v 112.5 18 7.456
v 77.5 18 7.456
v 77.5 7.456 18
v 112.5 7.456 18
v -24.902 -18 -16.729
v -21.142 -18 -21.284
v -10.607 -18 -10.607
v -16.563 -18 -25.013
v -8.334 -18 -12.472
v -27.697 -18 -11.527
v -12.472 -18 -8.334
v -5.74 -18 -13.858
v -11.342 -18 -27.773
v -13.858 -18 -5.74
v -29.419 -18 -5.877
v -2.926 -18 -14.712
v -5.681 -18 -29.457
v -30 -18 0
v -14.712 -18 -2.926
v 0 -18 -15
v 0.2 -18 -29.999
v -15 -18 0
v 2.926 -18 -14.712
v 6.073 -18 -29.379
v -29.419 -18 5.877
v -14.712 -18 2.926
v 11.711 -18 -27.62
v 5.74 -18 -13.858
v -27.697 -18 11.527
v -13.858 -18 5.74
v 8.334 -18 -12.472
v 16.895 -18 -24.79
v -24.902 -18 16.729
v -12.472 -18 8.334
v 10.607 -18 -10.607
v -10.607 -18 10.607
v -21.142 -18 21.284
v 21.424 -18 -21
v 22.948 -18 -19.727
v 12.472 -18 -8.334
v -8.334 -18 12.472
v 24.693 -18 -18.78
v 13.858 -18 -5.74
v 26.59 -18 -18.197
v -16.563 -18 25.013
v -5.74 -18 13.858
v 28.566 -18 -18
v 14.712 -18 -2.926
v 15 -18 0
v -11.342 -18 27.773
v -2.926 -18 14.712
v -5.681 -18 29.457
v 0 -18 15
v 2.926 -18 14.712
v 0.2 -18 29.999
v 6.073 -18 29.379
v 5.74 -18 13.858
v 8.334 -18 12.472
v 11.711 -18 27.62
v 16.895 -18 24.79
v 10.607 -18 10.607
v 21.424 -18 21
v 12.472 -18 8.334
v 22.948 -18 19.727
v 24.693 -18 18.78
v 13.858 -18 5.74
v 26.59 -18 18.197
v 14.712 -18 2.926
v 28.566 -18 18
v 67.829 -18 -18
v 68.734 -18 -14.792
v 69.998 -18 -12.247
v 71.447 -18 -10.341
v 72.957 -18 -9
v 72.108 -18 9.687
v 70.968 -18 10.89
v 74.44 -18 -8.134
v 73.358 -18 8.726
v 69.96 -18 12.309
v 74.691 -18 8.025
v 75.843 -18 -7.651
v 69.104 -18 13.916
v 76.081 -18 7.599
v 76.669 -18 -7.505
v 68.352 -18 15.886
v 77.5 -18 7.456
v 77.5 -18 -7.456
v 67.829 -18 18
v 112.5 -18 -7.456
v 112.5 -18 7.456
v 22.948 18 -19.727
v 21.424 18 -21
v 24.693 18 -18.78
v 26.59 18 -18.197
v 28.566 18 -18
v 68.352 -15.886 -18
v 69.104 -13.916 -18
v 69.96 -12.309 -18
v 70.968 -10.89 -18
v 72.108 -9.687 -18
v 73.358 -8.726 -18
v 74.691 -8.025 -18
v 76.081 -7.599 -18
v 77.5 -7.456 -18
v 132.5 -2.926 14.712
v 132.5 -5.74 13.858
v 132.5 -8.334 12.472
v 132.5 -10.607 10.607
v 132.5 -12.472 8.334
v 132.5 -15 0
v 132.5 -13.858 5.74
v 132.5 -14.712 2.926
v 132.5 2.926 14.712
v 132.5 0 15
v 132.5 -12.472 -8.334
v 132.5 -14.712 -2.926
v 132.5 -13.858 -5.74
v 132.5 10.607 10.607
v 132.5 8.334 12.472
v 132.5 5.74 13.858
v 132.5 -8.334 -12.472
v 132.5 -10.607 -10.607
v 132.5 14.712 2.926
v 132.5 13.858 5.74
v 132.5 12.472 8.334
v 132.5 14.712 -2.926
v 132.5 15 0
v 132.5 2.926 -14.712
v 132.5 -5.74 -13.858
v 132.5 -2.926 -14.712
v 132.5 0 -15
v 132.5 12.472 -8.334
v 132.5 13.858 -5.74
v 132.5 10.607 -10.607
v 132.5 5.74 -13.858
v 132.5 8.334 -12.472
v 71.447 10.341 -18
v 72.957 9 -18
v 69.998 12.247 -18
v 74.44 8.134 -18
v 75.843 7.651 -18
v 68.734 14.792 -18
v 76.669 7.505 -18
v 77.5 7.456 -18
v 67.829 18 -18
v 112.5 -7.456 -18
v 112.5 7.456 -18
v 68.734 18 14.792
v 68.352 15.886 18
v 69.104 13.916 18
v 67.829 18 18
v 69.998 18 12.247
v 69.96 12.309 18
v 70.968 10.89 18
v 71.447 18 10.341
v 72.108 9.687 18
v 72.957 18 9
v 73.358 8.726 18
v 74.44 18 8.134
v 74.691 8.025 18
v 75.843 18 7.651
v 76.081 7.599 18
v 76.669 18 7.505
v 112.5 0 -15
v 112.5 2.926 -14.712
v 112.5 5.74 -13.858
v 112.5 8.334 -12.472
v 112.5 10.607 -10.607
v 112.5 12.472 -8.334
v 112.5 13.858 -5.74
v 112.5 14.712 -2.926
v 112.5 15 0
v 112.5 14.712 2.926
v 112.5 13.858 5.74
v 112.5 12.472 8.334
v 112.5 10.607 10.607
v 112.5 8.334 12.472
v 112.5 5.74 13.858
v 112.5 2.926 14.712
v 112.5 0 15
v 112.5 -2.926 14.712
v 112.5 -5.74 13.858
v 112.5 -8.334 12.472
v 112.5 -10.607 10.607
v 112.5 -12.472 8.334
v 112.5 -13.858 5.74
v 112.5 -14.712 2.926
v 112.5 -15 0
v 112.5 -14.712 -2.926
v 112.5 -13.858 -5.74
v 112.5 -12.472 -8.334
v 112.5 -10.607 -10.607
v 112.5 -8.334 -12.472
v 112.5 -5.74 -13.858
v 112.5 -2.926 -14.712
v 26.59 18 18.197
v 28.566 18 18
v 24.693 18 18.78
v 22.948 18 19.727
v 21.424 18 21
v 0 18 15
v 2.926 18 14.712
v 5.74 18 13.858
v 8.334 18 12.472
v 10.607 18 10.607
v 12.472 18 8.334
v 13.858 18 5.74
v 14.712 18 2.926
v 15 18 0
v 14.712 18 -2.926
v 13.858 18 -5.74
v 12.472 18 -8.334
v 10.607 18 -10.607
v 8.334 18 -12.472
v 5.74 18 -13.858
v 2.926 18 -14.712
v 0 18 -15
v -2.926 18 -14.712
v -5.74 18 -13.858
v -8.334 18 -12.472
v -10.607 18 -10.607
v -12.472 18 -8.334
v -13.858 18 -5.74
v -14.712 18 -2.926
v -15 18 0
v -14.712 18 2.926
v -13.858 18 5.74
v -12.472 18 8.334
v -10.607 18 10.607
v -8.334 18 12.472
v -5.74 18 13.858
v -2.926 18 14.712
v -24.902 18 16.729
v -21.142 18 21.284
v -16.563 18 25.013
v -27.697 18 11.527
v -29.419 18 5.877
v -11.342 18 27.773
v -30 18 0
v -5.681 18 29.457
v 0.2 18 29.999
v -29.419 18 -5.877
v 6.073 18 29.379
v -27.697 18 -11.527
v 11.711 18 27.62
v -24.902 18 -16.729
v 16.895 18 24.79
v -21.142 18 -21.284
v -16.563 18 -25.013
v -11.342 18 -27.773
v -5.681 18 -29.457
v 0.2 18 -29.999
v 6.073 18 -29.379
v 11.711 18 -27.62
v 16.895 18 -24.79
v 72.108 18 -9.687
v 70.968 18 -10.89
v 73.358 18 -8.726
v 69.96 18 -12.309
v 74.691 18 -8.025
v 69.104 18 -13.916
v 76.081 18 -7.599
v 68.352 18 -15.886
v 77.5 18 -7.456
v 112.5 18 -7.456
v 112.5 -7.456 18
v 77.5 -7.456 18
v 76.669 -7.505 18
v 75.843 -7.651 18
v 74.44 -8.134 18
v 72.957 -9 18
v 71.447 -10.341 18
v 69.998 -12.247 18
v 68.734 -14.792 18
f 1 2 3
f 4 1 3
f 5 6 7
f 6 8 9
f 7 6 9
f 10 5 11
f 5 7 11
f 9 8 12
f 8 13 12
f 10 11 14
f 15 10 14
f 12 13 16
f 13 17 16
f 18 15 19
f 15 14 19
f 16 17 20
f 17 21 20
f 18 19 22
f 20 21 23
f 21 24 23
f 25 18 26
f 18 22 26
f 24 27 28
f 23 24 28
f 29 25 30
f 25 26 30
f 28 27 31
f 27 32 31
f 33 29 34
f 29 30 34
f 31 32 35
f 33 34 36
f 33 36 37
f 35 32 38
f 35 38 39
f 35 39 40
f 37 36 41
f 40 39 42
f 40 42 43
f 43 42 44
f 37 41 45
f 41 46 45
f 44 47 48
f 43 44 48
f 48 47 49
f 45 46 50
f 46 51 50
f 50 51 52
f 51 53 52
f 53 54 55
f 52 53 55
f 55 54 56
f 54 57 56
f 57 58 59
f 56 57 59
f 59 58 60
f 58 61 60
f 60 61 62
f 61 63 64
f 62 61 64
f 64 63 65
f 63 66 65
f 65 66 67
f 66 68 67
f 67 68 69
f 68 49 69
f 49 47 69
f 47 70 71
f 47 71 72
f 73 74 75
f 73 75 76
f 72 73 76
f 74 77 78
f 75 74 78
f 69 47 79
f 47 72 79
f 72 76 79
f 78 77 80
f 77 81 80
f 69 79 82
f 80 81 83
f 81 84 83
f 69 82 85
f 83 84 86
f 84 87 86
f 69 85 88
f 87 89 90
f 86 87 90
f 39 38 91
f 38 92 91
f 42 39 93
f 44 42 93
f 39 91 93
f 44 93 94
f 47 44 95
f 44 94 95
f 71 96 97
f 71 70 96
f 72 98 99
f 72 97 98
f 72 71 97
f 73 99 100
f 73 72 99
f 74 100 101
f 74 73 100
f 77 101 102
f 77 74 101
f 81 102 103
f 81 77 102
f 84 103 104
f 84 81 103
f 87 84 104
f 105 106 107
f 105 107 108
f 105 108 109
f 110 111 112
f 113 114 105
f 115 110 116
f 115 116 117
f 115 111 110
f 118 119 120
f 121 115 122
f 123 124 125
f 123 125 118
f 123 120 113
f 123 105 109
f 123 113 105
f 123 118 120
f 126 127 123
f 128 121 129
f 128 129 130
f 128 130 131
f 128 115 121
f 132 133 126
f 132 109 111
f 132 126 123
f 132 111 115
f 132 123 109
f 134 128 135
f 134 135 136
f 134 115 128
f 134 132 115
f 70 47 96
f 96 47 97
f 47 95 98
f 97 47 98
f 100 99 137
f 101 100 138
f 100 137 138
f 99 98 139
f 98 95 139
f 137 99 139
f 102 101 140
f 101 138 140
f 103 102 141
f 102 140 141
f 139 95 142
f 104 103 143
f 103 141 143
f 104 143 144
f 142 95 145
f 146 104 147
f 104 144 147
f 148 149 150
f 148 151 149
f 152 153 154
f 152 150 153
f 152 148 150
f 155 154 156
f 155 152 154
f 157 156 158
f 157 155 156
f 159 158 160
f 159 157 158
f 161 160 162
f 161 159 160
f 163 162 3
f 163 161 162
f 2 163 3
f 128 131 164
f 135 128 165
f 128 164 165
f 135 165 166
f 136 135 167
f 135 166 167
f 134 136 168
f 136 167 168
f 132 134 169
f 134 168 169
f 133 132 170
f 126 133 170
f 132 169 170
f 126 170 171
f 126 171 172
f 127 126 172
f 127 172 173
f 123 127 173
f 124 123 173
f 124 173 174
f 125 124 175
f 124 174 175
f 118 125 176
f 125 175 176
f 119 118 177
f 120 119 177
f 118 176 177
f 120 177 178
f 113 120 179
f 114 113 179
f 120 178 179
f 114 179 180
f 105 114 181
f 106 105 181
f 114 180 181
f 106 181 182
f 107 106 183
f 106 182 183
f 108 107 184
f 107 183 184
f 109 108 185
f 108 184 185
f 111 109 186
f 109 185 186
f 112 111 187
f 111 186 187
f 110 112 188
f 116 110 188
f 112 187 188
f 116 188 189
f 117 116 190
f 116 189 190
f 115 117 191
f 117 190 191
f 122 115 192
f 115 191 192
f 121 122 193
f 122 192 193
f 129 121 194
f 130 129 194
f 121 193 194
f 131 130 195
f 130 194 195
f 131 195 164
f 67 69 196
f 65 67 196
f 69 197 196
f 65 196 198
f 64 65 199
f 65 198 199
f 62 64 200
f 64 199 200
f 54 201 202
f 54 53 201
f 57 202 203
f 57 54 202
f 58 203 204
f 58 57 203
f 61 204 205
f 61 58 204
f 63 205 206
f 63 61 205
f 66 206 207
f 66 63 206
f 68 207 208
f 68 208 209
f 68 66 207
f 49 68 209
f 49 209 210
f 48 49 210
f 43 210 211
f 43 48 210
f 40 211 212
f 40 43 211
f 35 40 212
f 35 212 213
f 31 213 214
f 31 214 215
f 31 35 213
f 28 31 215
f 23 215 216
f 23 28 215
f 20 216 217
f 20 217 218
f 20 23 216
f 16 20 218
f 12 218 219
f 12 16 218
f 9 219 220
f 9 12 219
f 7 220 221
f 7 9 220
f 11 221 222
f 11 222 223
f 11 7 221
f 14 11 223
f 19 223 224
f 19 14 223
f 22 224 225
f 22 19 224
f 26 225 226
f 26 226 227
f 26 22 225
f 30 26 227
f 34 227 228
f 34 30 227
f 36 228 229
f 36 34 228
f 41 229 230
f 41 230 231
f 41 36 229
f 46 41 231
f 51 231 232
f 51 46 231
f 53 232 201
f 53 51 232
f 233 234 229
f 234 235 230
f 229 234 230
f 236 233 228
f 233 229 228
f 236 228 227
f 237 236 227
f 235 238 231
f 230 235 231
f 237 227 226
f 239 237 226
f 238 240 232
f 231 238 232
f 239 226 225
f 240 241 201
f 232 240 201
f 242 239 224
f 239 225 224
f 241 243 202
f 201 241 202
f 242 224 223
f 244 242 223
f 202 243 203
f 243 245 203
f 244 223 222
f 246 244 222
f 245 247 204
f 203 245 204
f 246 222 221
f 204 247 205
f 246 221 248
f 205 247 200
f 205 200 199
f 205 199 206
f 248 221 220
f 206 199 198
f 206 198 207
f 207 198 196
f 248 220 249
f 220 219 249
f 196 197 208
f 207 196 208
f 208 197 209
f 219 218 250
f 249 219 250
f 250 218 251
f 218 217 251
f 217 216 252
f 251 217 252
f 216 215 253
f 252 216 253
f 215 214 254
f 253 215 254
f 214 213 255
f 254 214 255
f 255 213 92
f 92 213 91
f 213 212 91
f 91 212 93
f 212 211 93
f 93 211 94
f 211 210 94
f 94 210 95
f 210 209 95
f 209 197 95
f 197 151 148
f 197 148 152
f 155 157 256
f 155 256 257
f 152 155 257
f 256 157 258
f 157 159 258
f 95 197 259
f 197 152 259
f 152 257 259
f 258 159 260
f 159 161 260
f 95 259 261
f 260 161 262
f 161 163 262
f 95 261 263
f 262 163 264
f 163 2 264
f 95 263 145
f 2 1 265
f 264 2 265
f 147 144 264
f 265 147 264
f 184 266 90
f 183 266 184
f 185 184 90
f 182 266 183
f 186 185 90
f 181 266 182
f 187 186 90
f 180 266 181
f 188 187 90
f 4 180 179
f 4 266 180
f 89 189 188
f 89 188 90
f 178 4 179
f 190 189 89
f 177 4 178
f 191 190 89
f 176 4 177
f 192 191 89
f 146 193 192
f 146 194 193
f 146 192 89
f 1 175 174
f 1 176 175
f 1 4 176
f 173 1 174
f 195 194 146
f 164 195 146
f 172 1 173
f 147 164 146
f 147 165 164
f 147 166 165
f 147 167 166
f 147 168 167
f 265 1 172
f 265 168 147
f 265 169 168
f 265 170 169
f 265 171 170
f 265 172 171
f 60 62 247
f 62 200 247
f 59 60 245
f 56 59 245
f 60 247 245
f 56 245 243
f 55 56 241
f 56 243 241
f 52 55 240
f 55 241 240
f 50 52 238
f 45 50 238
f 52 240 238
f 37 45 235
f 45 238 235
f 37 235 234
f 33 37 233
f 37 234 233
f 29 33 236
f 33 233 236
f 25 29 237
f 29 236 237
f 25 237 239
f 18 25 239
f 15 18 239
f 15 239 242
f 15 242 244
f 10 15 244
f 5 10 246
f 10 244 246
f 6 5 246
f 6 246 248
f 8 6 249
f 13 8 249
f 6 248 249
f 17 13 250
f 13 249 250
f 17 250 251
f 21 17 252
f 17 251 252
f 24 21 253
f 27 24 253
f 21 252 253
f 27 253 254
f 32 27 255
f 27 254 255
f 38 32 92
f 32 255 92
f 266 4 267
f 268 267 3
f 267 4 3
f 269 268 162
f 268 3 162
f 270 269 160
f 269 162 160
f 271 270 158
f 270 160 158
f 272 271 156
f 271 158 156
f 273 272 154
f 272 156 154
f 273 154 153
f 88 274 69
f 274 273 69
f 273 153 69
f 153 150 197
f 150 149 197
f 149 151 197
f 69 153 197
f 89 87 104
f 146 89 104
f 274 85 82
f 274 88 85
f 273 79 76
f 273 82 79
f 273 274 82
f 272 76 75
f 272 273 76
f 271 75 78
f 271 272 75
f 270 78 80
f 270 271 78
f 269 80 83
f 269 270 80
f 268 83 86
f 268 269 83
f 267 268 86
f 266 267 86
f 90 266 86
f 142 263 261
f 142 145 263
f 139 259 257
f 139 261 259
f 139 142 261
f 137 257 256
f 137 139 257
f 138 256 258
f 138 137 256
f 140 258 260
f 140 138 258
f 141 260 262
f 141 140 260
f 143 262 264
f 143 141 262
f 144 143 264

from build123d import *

# Parameters (mm, degrees)
CROQUIS1_R              = 15
SALIENTE_EXTRUIR1_DEPTH = 18
SALIENTE_EXTRUIR2_DEPTH = 45
CROQUIS3_R              = 15
SALIENTE_EXTRUIR3_DEPTH = 20
REDONDEO1_R             = 10
REDONDEO2_R             = 10


with BuildPart() as part:
    # Croquis1 → Saliente-Extruir1 (new, symmetric)
    with BuildSketch(Plane(origin=(0, 0, 0), x_dir=(1, 0, 0), z_dir=(0, 1, 0))):
        with BuildLine():
            Line((24, 18), (67.5, 18))
            Line((67.5, 18), (67.5, -18))
            Line((67.5, -18), (24, -18))
            ThreePointArc((24, -18), (-30, 0), (24, 18))
        make_face()
        with Locations(Location((0, 0, 0), (0, 0, 270))):
            Circle(CROQUIS1_R, mode=Mode.SUBTRACT)
    extrude(amount=SALIENTE_EXTRUIR1_DEPTH, both=True)

    # Croquis2 → Saliente-Extruir2 (add)
    with BuildSketch(Plane(origin=(67.5, 0, 0), x_dir=(0, 0, -1), z_dir=(1, 0, 0))):
        Polygon((-18, 7.455844123), (-18, -7.455844123), (-7.455844123, -18), (7.455844123, -18), (18, -7.455844123), (18, 7.455844123), (7.455844123, 18), (-7.455844123, 18), align=None)
    extrude(amount=SALIENTE_EXTRUIR2_DEPTH)

    # Croquis3 → Saliente-Extruir3 (add)
    with BuildSketch(Plane(origin=(112.5, 0, 0), x_dir=(0, 0, -1), z_dir=(1, 0, 0))):
        Circle(CROQUIS3_R)
    extrude(amount=SALIENTE_EXTRUIR3_DEPTH)

    # Redondeo1
    # the kernel refuses this fillet: 10 mm, written as the material it adds along each edge
    with BuildSketch(Plane(origin=(67.5, 10.221825407, 35.67766953), x_dir=(1, 0, 0), z_dir=(0, -0.7071067811865474, -0.7071067811865477))) as redondeo1_piece_1_section:
        with BuildLine():
            CenterArc((REDONDEO1_R, REDONDEO1_R), REDONDEO1_R, 180, 90)
            Line((0, REDONDEO1_R), (0, 0))
            Line((0, 0), (REDONDEO1_R, 0))
        make_face()
    redondeo1_piece_1 = extrude(amount=64.911688245, mode=Mode.PRIVATE)
    redondeo1_piece_1 = split(redondeo1_piece_1, bisect_by=Plane(origin=(70.275136412, -18, 13.729156697), z_dir=(0, 1, 0)), keep=Keep.TOP, mode=Mode.PRIVATE)
    redondeo1_piece_1 = split(redondeo1_piece_1, bisect_by=Plane(origin=(70.275136412, -13.729156697, 18), z_dir=(0, 0, -1)), keep=Keep.TOP, mode=Mode.PRIVATE)
    add(redondeo1_piece_1)
    with BuildSketch(Plane(origin=(67.5, -35.67766953, 10.221825407), x_dir=(0, -0.7071067811865476, -0.7071067811865476), z_dir=(0, 0.7071067811865475, -0.7071067811865476))) as redondeo1_piece_2_section:
        with BuildLine():
            CenterArc((REDONDEO1_R, -REDONDEO1_R), REDONDEO1_R, 90, 90)
            Line((0, -REDONDEO1_R), (0, 0))
            Line((0, 0), (REDONDEO1_R, 0))
        make_face()
    redondeo1_piece_2 = extrude(amount=64.911688245, mode=Mode.PRIVATE)
    redondeo1_piece_2 = split(redondeo1_piece_2, bisect_by=Plane(origin=(70.275136413, -13.729156697, -18), z_dir=(0, 0, 1)), keep=Keep.TOP, mode=Mode.PRIVATE)
    redondeo1_piece_2 = split(redondeo1_piece_2, bisect_by=Plane(origin=(70.275136413, -18, -13.729156697), z_dir=(0, 1, 0)), keep=Keep.TOP, mode=Mode.PRIVATE)
    add(redondeo1_piece_2)
    with BuildSketch(Plane(origin=(67.5, -10.221825407, -35.67766953), x_dir=(1, 0, 0), z_dir=(0, 0.7071067811865477, 0.7071067811865474))) as redondeo1_piece_3_section:
        with BuildLine():
            CenterArc((REDONDEO1_R, REDONDEO1_R), REDONDEO1_R, 180, 90)
            Line((0, REDONDEO1_R), (0, 0))
            Line((0, 0), (REDONDEO1_R, 0))
        make_face()
    redondeo1_piece_3 = extrude(amount=64.911688245, mode=Mode.PRIVATE)
    redondeo1_piece_3 = split(redondeo1_piece_3, bisect_by=Plane(origin=(70.275136412, 13.729156697, -18), z_dir=(0, 0, 1)), keep=Keep.TOP, mode=Mode.PRIVATE)
    redondeo1_piece_3 = split(redondeo1_piece_3, bisect_by=Plane(origin=(70.275136412, 18, -13.729156697), z_dir=(0, -1, 0)), keep=Keep.TOP, mode=Mode.PRIVATE)
    add(redondeo1_piece_3)
    with BuildSketch(Plane(origin=(67.5, 35.67766953, -10.221825407), x_dir=(1, 0, 0), z_dir=(0, -0.7071067811865476, 0.7071067811865476))) as redondeo1_piece_4_section:
        with BuildLine():
            CenterArc((REDONDEO1_R, REDONDEO1_R), REDONDEO1_R, 180, 90)
            Line((0, REDONDEO1_R), (0, 0))
            Line((0, 0), (REDONDEO1_R, 0))
        make_face()
    redondeo1_piece_4 = extrude(amount=64.911688245, mode=Mode.PRIVATE)
    redondeo1_piece_4 = split(redondeo1_piece_4, bisect_by=Plane(origin=(70.275136412, 18, 13.729156697), z_dir=(0, -1, 0)), keep=Keep.TOP, mode=Mode.PRIVATE)
    redondeo1_piece_4 = split(redondeo1_piece_4, bisect_by=Plane(origin=(70.275136412, 13.729156697, 18), z_dir=(0, 0, -1)), keep=Keep.TOP, mode=Mode.PRIVATE)
    add(redondeo1_piece_4)

    # Redondeo2
    redondeo2_edges = [part.edges().sort_by_distance(p)[0] for p in [
        (24, 0, 18),
        (24, 0, -18),
    ]]
    fillet(redondeo2_edges, radius=REDONDEO2_R)


solid = part.part
